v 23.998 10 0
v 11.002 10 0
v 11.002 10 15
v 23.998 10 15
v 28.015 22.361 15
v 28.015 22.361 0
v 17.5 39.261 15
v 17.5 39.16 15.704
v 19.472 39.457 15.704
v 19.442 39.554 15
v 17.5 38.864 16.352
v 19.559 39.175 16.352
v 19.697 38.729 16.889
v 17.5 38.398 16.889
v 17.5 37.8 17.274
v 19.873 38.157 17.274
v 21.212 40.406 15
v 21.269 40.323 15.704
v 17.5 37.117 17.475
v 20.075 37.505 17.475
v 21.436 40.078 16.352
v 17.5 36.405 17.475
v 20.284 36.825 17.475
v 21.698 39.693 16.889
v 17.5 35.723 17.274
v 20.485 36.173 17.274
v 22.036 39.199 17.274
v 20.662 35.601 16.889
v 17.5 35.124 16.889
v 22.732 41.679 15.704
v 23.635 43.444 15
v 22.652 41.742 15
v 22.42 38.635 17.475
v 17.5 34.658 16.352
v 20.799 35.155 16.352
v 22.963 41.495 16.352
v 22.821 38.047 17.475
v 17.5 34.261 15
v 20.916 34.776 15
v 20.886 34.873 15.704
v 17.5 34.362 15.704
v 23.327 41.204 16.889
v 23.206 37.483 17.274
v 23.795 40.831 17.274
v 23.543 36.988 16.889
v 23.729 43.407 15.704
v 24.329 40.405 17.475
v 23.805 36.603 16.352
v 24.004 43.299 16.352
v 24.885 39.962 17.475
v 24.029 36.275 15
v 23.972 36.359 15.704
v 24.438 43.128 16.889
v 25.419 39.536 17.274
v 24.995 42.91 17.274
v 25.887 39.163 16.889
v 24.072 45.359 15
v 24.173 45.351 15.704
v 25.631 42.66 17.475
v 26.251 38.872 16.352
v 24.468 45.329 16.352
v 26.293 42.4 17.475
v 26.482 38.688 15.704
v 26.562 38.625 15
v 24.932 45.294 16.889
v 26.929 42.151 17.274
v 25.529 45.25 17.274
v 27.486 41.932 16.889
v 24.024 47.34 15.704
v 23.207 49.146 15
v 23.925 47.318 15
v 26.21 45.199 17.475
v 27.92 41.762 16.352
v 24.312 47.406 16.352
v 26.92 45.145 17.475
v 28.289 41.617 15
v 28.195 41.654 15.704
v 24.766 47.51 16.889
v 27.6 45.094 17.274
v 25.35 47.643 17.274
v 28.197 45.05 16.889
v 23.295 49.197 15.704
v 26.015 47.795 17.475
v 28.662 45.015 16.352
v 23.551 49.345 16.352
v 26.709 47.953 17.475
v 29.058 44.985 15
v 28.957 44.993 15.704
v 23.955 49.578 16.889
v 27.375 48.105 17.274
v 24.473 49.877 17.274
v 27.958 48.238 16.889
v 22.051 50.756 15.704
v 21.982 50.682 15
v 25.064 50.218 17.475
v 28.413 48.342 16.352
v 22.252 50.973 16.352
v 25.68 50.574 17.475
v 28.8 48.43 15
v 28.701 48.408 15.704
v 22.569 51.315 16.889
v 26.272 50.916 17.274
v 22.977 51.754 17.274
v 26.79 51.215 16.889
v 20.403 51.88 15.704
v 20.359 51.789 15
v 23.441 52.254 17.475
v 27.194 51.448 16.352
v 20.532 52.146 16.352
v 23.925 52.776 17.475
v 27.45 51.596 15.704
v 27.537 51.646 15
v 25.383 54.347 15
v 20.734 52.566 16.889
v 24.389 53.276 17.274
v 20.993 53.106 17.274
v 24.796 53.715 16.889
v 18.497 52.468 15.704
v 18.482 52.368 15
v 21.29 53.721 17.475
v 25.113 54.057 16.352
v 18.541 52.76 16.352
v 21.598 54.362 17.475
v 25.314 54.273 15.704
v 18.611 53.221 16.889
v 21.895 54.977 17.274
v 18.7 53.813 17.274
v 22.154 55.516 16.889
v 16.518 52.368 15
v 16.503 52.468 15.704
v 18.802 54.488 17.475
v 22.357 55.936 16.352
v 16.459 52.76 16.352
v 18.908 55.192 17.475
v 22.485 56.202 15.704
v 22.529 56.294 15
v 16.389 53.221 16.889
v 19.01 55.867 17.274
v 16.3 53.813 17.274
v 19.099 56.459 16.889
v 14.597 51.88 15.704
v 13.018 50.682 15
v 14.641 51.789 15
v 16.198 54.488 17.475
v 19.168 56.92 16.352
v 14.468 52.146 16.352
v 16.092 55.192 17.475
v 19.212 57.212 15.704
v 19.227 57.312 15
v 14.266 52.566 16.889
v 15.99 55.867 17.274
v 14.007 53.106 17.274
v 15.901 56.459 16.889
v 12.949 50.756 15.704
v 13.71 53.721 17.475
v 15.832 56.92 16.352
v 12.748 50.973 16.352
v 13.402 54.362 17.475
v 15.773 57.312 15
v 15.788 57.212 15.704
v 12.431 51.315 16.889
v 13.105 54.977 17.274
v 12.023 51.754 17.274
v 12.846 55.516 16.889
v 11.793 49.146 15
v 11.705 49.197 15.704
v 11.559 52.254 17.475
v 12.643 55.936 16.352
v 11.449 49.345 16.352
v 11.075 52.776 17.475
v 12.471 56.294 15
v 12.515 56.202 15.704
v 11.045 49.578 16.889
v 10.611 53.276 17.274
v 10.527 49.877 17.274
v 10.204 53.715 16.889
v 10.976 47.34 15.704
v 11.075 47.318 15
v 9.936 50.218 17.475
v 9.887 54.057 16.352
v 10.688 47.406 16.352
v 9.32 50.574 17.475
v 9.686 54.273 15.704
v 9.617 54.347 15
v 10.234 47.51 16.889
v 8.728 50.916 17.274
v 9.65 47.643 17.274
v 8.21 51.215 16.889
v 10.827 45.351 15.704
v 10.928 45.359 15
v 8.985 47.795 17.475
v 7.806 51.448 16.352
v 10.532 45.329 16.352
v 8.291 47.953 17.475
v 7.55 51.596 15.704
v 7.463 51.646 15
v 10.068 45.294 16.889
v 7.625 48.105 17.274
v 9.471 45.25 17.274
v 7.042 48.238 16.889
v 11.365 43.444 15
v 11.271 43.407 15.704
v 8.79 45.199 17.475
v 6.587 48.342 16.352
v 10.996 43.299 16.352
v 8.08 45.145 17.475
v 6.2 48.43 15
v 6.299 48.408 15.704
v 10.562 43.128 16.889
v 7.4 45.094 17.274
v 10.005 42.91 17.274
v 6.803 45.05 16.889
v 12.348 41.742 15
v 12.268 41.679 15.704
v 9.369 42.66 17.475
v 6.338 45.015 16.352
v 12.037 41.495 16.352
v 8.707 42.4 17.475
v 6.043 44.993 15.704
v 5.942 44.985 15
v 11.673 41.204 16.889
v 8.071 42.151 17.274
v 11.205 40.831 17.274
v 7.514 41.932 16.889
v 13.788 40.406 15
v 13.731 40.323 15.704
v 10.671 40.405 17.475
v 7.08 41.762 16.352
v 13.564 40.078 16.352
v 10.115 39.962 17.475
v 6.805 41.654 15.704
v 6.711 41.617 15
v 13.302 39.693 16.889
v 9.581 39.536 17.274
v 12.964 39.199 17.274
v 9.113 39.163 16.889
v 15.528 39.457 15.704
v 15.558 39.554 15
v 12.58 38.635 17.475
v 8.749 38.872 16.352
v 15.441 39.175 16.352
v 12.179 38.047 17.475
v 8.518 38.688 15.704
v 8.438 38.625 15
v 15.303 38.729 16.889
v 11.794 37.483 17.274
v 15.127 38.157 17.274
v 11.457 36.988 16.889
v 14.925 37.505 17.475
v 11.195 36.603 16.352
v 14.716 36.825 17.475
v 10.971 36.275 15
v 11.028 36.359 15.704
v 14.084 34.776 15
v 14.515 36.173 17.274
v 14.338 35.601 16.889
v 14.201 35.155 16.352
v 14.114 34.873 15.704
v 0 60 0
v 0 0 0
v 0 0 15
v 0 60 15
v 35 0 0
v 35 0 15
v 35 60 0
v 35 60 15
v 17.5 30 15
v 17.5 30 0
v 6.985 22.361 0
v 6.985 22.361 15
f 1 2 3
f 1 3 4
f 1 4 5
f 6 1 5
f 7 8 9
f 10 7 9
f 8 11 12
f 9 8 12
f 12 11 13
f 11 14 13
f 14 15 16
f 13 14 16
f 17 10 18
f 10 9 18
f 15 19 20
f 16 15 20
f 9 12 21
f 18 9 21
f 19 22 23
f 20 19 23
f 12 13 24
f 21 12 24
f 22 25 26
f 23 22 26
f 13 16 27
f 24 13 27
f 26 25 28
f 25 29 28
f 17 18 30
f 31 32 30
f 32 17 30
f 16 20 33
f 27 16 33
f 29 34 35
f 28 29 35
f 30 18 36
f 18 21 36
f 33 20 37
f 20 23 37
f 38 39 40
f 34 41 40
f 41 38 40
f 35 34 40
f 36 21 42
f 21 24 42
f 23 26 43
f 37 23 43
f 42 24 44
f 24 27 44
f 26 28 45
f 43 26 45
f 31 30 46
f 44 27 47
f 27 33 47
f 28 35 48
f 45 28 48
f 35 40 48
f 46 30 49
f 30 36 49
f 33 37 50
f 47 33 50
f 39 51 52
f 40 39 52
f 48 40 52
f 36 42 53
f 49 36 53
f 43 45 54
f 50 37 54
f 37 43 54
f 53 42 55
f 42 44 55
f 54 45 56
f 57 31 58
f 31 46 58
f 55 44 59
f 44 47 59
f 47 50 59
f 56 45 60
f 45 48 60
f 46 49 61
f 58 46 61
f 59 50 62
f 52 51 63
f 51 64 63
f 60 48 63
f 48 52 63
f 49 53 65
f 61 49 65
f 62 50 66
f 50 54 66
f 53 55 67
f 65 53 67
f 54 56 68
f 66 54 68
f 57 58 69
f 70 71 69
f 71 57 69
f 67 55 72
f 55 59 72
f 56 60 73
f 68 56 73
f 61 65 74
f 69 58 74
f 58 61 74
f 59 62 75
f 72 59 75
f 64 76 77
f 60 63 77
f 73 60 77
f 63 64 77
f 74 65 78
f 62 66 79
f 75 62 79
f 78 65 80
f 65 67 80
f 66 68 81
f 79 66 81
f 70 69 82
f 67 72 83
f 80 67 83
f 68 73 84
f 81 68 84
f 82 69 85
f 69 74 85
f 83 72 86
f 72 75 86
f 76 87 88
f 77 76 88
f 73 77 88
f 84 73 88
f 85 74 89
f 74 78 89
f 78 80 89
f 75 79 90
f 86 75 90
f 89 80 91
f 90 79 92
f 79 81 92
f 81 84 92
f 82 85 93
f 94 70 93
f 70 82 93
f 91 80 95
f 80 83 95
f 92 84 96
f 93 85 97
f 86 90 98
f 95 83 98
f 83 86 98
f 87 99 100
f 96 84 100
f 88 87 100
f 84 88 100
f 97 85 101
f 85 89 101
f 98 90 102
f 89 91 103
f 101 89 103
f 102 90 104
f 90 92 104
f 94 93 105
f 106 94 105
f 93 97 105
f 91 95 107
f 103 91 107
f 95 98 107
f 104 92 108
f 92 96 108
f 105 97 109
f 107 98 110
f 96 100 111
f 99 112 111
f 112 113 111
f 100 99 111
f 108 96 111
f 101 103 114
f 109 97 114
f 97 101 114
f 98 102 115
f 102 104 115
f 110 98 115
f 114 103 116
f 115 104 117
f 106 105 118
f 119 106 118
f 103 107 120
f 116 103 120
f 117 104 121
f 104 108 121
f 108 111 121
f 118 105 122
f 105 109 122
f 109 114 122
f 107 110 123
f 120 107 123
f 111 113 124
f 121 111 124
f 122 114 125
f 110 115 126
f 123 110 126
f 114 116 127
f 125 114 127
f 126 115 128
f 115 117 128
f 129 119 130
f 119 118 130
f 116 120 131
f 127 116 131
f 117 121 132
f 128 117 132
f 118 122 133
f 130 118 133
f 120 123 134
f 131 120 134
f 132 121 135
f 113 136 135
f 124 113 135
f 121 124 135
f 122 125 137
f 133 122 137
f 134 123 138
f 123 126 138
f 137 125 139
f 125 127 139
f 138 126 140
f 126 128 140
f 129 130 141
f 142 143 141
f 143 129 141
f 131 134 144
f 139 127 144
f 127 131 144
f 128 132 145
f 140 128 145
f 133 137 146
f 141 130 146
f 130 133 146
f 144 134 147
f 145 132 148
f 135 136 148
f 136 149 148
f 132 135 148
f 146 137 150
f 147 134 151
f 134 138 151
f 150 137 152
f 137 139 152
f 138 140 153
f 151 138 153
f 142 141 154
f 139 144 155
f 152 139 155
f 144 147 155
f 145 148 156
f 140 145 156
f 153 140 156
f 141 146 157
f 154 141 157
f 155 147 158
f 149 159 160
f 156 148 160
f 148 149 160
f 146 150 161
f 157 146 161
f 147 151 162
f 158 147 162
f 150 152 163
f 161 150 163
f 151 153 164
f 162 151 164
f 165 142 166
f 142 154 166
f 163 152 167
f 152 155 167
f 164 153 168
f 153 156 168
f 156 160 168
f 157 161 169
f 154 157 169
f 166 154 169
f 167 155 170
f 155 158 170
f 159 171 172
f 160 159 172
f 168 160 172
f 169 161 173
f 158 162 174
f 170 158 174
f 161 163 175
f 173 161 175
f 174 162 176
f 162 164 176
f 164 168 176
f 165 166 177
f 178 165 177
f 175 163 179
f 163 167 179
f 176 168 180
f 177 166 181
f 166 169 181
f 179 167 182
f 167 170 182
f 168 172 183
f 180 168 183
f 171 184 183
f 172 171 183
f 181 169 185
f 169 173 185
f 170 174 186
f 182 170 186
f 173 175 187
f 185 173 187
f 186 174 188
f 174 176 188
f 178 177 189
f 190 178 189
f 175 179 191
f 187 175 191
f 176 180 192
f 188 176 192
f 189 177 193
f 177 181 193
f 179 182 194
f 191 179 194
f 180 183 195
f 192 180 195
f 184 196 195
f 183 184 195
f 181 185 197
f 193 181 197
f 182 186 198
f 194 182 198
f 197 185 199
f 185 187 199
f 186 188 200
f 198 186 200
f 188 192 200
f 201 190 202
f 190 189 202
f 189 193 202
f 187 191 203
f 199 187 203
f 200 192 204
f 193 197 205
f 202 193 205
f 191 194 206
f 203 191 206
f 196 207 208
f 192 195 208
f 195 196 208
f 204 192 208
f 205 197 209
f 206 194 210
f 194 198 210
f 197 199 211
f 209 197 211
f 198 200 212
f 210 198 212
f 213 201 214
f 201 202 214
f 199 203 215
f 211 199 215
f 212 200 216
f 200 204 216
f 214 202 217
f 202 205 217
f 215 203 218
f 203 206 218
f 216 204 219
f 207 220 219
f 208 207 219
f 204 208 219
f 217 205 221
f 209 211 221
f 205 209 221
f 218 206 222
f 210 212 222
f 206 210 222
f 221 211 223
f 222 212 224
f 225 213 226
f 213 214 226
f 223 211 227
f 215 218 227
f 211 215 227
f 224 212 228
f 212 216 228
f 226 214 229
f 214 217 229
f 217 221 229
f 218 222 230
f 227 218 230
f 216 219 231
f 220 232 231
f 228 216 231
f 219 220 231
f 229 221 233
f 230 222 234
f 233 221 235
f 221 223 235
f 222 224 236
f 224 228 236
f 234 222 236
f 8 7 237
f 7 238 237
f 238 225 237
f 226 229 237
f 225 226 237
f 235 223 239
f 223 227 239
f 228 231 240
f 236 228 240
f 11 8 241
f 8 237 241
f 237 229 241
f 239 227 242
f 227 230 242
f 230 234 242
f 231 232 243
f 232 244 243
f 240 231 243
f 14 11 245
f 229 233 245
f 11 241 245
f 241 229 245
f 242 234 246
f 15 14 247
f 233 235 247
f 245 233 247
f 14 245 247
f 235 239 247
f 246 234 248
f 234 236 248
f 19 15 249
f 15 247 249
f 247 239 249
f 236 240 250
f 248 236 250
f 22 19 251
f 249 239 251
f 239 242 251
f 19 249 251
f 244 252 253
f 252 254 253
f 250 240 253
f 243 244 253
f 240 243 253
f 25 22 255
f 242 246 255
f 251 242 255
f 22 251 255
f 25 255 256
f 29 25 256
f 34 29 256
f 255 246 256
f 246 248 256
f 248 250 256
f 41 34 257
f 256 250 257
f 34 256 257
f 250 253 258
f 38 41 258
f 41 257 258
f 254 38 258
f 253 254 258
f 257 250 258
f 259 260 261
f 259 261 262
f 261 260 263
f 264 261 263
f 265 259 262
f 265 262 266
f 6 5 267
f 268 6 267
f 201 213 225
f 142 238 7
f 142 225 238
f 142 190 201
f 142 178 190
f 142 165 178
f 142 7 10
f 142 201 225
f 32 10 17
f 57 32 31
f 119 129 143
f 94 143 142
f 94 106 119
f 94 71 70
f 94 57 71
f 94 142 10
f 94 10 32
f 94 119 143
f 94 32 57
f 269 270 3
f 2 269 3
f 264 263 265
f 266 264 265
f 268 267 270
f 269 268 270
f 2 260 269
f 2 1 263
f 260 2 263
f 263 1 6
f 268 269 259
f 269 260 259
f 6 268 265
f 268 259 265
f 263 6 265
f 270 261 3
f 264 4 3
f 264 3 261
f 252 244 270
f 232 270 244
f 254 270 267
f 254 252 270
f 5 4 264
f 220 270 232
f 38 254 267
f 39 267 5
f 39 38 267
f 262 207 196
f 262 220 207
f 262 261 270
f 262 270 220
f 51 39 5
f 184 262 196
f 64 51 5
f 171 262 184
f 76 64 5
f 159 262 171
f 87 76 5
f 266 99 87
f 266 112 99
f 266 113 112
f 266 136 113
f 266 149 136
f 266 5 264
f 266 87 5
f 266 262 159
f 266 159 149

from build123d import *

# Parameters (mm, degrees)
F0_W     = 35
F0_H     = 60
F1_DEPTH = 15
F3_DEPTH = 25


with BuildPart() as f1:
    # F0 (on Top) → F1 (new body)
    with BuildSketch(Plane.XY):
        with Locations((17.5, 30)):
            Rectangle(F0_W, F0_H)
    extrude(amount=F1_DEPTH)

    # F2 (on face) → F3 (cut)
    with BuildSketch(Plane.XY.offset(15)):
        Polygon((23.9983939247, 10), (28.0146222424, 22.360679775), (17.5, 30), (6.9853777576, 22.360679775), (11.0016060753, 10), align=None)
    extrude(amount=-F3_DEPTH, mode=Mode.SUBTRACT)

    # F5 (on mid) → F6 (revolve)
    with BuildSketch(Plane.YZ.offset(17.5)):
        with BuildLine():
            Line((34.2611013353, 15), (39.2611013353, 15))
            ThreePointArc((39.2611013353, 15), (36.7611013353, 17.5), (34.2611013353, 15))
        make_face()
        with BuildLine():
            ThreePointArc((34.2611013353, 15), (36.7611013353, 12.5), (39.2611013353, 15))
            Line((39.2611013353, 15), (34.2611013353, 15))
        make_face()
    revolve(axis=Axis((17.5, 45.8512790501, 18.8291036189), (0, 0, 1)))


solid = f1.part
